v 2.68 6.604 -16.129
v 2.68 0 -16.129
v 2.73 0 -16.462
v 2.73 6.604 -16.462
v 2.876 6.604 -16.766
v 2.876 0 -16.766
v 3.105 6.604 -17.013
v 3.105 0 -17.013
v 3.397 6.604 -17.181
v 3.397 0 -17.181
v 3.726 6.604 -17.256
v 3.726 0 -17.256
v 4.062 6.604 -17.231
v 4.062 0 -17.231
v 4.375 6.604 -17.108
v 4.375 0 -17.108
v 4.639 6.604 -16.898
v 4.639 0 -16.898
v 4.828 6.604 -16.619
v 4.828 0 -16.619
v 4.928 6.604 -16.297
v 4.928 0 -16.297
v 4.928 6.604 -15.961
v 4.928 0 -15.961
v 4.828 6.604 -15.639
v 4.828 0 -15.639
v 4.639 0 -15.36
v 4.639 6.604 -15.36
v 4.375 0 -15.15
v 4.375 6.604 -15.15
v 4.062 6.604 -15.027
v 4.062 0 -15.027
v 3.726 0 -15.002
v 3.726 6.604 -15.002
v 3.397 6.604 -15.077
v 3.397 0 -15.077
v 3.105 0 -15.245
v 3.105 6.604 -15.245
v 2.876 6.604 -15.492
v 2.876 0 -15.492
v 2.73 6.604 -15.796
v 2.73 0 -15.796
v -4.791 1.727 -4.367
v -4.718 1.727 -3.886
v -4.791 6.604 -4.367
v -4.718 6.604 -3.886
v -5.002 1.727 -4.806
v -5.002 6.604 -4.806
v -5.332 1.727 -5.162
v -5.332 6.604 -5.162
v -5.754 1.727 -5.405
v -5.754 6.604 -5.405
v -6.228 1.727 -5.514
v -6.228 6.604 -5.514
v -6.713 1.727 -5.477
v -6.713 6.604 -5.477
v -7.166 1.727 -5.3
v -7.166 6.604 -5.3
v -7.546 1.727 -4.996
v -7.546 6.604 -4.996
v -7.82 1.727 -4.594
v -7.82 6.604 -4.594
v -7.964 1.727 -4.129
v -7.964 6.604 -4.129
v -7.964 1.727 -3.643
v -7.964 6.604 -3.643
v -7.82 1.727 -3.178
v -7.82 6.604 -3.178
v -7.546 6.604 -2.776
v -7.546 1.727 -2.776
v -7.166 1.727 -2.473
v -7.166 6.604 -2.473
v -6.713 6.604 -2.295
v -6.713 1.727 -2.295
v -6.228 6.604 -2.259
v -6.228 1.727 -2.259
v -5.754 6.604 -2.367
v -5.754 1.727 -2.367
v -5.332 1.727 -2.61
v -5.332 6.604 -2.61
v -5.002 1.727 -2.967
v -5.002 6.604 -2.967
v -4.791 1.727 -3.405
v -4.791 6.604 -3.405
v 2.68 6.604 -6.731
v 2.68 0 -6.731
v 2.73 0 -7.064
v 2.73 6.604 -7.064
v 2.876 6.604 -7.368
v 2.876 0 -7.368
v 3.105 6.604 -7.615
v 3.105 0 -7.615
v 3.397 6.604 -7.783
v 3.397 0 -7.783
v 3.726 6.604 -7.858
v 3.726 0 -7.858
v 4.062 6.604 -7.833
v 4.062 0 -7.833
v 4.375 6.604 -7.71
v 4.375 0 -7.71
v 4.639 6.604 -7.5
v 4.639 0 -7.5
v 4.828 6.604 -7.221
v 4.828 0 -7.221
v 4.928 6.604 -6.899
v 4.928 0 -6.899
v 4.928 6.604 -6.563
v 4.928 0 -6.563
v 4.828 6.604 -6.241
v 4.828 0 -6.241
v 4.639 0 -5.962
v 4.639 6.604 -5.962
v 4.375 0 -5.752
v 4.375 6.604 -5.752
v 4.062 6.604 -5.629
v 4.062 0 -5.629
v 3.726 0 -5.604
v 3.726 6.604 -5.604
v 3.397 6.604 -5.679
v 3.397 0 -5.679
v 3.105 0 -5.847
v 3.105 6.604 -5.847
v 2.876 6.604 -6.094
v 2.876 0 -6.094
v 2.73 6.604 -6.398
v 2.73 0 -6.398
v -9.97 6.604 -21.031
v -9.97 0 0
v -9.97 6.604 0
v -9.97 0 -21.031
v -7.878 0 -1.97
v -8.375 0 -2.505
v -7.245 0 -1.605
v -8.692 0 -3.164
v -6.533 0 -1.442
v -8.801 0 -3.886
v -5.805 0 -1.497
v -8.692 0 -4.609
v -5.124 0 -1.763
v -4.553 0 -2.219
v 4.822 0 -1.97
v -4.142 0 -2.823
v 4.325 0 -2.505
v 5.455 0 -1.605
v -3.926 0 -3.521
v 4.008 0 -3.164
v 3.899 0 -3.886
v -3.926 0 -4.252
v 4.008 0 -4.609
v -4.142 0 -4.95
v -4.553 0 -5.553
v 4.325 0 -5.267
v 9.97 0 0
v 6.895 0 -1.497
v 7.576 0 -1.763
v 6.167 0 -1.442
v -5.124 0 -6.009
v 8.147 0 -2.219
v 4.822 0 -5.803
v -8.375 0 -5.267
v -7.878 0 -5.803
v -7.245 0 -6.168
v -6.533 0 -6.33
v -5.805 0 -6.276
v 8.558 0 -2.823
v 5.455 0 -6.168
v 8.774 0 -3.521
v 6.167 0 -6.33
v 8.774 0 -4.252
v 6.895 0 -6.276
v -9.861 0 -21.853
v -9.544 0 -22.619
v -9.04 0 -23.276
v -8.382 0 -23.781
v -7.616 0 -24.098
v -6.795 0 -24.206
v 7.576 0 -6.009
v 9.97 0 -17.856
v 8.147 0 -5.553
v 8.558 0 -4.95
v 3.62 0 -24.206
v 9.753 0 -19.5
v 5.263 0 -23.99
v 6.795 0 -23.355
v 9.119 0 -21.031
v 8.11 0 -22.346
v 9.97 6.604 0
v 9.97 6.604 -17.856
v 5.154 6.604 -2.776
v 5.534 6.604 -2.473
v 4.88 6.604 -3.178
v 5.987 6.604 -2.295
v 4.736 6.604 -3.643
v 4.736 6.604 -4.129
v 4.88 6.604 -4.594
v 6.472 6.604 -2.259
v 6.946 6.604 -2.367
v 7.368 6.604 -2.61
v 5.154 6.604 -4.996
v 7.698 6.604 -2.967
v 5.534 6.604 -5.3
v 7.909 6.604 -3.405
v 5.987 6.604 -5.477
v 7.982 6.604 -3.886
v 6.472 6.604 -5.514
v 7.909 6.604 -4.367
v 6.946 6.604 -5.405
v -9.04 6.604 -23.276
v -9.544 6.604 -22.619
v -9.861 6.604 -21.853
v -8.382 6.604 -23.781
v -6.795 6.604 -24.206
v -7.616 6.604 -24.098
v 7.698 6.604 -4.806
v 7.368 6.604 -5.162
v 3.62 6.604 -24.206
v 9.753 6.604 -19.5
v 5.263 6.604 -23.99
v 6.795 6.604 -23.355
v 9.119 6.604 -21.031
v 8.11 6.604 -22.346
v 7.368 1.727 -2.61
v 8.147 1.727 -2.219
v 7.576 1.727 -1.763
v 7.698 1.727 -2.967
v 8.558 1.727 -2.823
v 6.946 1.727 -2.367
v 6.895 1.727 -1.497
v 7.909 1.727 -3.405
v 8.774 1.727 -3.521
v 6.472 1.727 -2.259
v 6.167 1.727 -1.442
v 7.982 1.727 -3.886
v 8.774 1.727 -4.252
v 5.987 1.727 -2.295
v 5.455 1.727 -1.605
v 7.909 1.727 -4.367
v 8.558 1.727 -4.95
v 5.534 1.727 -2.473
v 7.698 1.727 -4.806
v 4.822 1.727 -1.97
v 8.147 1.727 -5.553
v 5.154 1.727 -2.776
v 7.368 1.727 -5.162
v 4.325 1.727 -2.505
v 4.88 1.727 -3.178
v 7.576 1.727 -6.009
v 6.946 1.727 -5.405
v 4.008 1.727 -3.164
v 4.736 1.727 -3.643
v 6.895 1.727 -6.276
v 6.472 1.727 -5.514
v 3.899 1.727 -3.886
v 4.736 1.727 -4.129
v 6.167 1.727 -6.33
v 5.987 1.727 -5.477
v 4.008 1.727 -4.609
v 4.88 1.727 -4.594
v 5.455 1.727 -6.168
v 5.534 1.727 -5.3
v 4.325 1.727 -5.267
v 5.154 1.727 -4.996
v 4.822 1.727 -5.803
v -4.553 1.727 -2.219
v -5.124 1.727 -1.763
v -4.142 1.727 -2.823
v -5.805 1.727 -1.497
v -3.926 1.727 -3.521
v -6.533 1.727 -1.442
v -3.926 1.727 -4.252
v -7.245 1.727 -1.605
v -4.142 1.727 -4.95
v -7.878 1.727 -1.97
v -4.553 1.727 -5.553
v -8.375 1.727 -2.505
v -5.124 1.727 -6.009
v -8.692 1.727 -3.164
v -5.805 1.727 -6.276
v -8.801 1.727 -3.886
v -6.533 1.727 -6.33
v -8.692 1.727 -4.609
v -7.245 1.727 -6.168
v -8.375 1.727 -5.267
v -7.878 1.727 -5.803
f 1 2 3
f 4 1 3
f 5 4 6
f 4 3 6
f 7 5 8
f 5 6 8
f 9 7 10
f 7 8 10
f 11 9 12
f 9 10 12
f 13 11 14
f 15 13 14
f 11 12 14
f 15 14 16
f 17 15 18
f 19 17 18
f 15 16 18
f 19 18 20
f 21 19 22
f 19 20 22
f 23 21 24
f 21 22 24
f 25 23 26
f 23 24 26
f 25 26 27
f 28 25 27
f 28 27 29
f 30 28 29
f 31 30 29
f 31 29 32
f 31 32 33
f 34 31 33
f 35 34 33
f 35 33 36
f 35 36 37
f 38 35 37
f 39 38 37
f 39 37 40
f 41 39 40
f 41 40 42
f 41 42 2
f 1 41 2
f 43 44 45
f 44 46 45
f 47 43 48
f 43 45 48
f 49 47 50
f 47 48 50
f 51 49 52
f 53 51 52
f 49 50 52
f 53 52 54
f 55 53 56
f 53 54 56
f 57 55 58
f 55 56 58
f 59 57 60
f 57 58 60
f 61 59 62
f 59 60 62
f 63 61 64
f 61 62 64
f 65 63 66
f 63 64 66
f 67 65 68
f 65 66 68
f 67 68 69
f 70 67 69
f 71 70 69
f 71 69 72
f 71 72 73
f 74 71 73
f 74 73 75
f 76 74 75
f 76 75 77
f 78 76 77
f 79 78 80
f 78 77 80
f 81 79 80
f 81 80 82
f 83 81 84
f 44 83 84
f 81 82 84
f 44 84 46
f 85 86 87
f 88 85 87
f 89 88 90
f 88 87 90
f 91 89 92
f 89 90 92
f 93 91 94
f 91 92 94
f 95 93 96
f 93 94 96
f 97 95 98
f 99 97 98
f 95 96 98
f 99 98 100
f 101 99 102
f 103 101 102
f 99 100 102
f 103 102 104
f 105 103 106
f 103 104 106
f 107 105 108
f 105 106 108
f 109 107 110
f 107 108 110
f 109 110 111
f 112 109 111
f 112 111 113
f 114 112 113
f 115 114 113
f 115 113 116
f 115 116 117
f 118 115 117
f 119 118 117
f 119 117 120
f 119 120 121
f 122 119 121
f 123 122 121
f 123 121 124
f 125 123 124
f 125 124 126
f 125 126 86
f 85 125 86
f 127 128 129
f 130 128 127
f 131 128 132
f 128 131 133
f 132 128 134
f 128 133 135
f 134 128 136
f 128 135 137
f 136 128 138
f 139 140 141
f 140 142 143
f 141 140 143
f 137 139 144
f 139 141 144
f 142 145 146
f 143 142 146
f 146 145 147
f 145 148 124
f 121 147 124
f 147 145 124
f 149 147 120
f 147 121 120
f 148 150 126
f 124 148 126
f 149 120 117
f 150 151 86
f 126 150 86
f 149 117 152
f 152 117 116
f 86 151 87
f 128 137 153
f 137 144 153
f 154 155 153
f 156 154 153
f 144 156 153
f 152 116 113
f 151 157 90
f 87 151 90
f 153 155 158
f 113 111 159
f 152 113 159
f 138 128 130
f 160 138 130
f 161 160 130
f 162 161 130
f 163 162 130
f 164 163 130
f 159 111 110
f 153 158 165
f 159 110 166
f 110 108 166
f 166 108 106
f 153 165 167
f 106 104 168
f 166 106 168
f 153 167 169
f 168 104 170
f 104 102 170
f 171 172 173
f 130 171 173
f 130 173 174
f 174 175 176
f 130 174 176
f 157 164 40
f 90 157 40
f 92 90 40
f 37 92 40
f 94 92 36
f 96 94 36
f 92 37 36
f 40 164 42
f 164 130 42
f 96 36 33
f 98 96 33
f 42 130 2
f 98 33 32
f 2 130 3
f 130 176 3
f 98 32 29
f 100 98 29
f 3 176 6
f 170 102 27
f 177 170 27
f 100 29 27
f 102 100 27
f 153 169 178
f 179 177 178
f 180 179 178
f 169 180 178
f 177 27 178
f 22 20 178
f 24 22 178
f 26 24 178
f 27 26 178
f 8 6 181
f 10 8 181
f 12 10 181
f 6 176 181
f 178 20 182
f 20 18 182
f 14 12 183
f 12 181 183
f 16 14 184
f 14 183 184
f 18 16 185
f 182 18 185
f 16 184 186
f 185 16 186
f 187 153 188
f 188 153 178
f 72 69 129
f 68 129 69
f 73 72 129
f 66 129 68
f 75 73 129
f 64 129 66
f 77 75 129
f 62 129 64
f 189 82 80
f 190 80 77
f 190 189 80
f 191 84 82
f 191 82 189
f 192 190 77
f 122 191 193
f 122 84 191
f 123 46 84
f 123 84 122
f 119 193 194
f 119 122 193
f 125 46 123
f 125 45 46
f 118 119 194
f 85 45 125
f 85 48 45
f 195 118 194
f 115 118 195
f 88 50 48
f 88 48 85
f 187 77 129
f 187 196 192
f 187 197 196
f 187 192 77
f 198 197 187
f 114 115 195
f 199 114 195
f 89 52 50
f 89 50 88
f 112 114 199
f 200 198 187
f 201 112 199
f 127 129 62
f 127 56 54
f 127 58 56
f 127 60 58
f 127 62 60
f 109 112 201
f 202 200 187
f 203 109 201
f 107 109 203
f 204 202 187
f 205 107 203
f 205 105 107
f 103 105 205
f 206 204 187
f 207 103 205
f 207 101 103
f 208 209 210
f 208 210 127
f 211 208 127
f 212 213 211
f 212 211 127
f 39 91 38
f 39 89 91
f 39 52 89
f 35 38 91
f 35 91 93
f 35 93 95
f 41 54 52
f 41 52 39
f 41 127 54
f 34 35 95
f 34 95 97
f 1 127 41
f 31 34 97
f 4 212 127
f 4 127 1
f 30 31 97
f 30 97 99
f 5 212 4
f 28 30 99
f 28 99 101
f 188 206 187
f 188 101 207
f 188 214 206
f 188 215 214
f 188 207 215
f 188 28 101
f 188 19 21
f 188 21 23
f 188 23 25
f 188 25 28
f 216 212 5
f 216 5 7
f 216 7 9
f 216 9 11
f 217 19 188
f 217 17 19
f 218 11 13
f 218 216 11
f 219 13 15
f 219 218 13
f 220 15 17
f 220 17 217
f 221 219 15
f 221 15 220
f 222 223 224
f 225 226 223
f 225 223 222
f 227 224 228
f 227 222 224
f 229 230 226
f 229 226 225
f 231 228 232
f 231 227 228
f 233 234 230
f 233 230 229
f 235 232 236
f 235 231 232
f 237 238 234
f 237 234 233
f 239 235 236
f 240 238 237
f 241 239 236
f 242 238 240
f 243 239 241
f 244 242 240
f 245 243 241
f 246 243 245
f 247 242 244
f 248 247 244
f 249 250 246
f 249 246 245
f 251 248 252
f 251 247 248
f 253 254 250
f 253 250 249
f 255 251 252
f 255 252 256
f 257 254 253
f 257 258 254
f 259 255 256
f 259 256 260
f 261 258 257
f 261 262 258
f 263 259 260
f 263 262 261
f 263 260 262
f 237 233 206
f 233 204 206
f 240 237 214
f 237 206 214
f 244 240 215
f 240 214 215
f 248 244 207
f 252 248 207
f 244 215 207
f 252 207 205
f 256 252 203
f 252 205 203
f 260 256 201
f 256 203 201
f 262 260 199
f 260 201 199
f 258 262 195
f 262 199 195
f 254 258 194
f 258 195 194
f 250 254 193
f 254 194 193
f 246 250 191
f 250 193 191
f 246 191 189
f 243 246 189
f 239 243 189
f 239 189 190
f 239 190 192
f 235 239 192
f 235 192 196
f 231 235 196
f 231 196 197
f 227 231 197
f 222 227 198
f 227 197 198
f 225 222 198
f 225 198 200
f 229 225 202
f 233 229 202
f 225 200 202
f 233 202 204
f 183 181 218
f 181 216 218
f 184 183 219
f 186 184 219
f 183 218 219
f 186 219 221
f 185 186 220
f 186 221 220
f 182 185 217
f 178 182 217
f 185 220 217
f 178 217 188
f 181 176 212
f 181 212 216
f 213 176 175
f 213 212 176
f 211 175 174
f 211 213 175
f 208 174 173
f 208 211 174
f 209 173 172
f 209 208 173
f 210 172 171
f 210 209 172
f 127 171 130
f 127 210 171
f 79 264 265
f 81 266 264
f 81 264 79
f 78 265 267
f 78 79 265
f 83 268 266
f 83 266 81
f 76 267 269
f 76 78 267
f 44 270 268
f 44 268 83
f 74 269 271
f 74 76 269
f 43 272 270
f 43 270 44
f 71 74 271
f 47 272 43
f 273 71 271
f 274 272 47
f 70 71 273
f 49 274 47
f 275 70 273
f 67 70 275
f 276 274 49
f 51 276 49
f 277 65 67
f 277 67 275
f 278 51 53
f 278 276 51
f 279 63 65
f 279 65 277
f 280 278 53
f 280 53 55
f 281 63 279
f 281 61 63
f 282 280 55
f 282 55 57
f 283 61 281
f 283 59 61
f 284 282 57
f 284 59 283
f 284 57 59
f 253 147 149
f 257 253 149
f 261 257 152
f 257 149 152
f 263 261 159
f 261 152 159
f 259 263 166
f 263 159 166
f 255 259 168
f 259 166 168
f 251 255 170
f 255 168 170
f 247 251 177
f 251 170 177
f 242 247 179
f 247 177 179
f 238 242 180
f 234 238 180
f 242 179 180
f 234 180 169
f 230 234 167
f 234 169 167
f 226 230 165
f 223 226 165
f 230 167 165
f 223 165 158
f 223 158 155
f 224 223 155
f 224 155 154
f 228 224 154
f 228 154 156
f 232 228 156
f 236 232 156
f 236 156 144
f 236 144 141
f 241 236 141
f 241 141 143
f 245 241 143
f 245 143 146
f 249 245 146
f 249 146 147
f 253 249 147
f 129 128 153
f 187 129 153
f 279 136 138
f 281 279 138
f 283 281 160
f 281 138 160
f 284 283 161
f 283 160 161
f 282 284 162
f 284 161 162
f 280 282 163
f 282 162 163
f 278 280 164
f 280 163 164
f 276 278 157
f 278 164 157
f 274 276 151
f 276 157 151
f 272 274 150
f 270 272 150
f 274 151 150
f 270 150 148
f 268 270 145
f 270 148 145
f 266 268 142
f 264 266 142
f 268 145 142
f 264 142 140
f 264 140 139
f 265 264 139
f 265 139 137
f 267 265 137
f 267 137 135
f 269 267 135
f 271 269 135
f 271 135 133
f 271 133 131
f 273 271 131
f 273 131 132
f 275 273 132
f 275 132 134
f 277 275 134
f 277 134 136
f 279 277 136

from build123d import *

# Parameters (mm, degrees)
SKETCH1_W                                           = 19.939
SKETCH1_H                                           = 24.2062
BOSS_EXTRUDE1_DEPTH                                 = 6.604
F_4_40_TAPPED_HOLE1_D                               = 2.2606
F_4_40_TAPPED_HOLE1_DEPTH                           = 6.604
CBORE_FOR_4_BINDING_HEAD_MACHINE_SCREW3_D           = 3.2639
CBORE_FOR_4_BINDING_HEAD_MACHINE_SCREW3_CBORE_D     = 4.9022
CBORE_FOR_4_BINDING_HEAD_MACHINE_SCREW3_CBORE_DEPTH = 1.7272
FILLET1_R                                           = 6.35
FILLET2_R                                           = 3.175


with BuildPart() as part:
    # Sketch1 → Boss-Extrude1 (new body)
    with BuildSketch(Plane(origin=(0, 0, 0), x_dir=(1, 0, 0), z_dir=(0, 1, 0))):
        with Locations((0, 12.1031)):
            Rectangle(SKETCH1_W, SKETCH1_H)
    extrude(amount=BOSS_EXTRUDE1_DEPTH)

    # #4-40 Tapped Hole1
    with Locations(Plane(origin=(0, 6.604, 0), x_dir=(1, 0, 0), z_dir=(0, 1, 0))):
        with Locations((3.81, 16.129), (3.81, 6.731)):
            Hole(F_4_40_TAPPED_HOLE1_D / 2, depth=F_4_40_TAPPED_HOLE1_DEPTH)

    # CBORE for #4 Binding Head Machine Screw3 (through all)
    with Locations(Plane(origin=(0, 0, 0), x_dir=(-1, 0, 0), z_dir=(0, -1, 0))):
        with Locations((6.35, 3.8862), (-6.35, 3.8862)):
            CounterBoreHole(CBORE_FOR_4_BINDING_HEAD_MACHINE_SCREW3_D / 2, CBORE_FOR_4_BINDING_HEAD_MACHINE_SCREW3_CBORE_D / 2, CBORE_FOR_4_BINDING_HEAD_MACHINE_SCREW3_CBORE_DEPTH)

    # Fillet1
    fillet1_edges = [part.edges().sort_by_distance(p)[0] for p in [
        (9.9695, 3.302, -24.2062),
    ]]
    fillet(fillet1_edges, radius=FILLET1_R)

    # Fillet2
    fillet2_edges = [part.edges().sort_by_distance(p)[0] for p in [
        (-9.9695, 3.302, -24.2062),
    ]]
    fillet(fillet2_edges, radius=FILLET2_R)


solid = part.part
